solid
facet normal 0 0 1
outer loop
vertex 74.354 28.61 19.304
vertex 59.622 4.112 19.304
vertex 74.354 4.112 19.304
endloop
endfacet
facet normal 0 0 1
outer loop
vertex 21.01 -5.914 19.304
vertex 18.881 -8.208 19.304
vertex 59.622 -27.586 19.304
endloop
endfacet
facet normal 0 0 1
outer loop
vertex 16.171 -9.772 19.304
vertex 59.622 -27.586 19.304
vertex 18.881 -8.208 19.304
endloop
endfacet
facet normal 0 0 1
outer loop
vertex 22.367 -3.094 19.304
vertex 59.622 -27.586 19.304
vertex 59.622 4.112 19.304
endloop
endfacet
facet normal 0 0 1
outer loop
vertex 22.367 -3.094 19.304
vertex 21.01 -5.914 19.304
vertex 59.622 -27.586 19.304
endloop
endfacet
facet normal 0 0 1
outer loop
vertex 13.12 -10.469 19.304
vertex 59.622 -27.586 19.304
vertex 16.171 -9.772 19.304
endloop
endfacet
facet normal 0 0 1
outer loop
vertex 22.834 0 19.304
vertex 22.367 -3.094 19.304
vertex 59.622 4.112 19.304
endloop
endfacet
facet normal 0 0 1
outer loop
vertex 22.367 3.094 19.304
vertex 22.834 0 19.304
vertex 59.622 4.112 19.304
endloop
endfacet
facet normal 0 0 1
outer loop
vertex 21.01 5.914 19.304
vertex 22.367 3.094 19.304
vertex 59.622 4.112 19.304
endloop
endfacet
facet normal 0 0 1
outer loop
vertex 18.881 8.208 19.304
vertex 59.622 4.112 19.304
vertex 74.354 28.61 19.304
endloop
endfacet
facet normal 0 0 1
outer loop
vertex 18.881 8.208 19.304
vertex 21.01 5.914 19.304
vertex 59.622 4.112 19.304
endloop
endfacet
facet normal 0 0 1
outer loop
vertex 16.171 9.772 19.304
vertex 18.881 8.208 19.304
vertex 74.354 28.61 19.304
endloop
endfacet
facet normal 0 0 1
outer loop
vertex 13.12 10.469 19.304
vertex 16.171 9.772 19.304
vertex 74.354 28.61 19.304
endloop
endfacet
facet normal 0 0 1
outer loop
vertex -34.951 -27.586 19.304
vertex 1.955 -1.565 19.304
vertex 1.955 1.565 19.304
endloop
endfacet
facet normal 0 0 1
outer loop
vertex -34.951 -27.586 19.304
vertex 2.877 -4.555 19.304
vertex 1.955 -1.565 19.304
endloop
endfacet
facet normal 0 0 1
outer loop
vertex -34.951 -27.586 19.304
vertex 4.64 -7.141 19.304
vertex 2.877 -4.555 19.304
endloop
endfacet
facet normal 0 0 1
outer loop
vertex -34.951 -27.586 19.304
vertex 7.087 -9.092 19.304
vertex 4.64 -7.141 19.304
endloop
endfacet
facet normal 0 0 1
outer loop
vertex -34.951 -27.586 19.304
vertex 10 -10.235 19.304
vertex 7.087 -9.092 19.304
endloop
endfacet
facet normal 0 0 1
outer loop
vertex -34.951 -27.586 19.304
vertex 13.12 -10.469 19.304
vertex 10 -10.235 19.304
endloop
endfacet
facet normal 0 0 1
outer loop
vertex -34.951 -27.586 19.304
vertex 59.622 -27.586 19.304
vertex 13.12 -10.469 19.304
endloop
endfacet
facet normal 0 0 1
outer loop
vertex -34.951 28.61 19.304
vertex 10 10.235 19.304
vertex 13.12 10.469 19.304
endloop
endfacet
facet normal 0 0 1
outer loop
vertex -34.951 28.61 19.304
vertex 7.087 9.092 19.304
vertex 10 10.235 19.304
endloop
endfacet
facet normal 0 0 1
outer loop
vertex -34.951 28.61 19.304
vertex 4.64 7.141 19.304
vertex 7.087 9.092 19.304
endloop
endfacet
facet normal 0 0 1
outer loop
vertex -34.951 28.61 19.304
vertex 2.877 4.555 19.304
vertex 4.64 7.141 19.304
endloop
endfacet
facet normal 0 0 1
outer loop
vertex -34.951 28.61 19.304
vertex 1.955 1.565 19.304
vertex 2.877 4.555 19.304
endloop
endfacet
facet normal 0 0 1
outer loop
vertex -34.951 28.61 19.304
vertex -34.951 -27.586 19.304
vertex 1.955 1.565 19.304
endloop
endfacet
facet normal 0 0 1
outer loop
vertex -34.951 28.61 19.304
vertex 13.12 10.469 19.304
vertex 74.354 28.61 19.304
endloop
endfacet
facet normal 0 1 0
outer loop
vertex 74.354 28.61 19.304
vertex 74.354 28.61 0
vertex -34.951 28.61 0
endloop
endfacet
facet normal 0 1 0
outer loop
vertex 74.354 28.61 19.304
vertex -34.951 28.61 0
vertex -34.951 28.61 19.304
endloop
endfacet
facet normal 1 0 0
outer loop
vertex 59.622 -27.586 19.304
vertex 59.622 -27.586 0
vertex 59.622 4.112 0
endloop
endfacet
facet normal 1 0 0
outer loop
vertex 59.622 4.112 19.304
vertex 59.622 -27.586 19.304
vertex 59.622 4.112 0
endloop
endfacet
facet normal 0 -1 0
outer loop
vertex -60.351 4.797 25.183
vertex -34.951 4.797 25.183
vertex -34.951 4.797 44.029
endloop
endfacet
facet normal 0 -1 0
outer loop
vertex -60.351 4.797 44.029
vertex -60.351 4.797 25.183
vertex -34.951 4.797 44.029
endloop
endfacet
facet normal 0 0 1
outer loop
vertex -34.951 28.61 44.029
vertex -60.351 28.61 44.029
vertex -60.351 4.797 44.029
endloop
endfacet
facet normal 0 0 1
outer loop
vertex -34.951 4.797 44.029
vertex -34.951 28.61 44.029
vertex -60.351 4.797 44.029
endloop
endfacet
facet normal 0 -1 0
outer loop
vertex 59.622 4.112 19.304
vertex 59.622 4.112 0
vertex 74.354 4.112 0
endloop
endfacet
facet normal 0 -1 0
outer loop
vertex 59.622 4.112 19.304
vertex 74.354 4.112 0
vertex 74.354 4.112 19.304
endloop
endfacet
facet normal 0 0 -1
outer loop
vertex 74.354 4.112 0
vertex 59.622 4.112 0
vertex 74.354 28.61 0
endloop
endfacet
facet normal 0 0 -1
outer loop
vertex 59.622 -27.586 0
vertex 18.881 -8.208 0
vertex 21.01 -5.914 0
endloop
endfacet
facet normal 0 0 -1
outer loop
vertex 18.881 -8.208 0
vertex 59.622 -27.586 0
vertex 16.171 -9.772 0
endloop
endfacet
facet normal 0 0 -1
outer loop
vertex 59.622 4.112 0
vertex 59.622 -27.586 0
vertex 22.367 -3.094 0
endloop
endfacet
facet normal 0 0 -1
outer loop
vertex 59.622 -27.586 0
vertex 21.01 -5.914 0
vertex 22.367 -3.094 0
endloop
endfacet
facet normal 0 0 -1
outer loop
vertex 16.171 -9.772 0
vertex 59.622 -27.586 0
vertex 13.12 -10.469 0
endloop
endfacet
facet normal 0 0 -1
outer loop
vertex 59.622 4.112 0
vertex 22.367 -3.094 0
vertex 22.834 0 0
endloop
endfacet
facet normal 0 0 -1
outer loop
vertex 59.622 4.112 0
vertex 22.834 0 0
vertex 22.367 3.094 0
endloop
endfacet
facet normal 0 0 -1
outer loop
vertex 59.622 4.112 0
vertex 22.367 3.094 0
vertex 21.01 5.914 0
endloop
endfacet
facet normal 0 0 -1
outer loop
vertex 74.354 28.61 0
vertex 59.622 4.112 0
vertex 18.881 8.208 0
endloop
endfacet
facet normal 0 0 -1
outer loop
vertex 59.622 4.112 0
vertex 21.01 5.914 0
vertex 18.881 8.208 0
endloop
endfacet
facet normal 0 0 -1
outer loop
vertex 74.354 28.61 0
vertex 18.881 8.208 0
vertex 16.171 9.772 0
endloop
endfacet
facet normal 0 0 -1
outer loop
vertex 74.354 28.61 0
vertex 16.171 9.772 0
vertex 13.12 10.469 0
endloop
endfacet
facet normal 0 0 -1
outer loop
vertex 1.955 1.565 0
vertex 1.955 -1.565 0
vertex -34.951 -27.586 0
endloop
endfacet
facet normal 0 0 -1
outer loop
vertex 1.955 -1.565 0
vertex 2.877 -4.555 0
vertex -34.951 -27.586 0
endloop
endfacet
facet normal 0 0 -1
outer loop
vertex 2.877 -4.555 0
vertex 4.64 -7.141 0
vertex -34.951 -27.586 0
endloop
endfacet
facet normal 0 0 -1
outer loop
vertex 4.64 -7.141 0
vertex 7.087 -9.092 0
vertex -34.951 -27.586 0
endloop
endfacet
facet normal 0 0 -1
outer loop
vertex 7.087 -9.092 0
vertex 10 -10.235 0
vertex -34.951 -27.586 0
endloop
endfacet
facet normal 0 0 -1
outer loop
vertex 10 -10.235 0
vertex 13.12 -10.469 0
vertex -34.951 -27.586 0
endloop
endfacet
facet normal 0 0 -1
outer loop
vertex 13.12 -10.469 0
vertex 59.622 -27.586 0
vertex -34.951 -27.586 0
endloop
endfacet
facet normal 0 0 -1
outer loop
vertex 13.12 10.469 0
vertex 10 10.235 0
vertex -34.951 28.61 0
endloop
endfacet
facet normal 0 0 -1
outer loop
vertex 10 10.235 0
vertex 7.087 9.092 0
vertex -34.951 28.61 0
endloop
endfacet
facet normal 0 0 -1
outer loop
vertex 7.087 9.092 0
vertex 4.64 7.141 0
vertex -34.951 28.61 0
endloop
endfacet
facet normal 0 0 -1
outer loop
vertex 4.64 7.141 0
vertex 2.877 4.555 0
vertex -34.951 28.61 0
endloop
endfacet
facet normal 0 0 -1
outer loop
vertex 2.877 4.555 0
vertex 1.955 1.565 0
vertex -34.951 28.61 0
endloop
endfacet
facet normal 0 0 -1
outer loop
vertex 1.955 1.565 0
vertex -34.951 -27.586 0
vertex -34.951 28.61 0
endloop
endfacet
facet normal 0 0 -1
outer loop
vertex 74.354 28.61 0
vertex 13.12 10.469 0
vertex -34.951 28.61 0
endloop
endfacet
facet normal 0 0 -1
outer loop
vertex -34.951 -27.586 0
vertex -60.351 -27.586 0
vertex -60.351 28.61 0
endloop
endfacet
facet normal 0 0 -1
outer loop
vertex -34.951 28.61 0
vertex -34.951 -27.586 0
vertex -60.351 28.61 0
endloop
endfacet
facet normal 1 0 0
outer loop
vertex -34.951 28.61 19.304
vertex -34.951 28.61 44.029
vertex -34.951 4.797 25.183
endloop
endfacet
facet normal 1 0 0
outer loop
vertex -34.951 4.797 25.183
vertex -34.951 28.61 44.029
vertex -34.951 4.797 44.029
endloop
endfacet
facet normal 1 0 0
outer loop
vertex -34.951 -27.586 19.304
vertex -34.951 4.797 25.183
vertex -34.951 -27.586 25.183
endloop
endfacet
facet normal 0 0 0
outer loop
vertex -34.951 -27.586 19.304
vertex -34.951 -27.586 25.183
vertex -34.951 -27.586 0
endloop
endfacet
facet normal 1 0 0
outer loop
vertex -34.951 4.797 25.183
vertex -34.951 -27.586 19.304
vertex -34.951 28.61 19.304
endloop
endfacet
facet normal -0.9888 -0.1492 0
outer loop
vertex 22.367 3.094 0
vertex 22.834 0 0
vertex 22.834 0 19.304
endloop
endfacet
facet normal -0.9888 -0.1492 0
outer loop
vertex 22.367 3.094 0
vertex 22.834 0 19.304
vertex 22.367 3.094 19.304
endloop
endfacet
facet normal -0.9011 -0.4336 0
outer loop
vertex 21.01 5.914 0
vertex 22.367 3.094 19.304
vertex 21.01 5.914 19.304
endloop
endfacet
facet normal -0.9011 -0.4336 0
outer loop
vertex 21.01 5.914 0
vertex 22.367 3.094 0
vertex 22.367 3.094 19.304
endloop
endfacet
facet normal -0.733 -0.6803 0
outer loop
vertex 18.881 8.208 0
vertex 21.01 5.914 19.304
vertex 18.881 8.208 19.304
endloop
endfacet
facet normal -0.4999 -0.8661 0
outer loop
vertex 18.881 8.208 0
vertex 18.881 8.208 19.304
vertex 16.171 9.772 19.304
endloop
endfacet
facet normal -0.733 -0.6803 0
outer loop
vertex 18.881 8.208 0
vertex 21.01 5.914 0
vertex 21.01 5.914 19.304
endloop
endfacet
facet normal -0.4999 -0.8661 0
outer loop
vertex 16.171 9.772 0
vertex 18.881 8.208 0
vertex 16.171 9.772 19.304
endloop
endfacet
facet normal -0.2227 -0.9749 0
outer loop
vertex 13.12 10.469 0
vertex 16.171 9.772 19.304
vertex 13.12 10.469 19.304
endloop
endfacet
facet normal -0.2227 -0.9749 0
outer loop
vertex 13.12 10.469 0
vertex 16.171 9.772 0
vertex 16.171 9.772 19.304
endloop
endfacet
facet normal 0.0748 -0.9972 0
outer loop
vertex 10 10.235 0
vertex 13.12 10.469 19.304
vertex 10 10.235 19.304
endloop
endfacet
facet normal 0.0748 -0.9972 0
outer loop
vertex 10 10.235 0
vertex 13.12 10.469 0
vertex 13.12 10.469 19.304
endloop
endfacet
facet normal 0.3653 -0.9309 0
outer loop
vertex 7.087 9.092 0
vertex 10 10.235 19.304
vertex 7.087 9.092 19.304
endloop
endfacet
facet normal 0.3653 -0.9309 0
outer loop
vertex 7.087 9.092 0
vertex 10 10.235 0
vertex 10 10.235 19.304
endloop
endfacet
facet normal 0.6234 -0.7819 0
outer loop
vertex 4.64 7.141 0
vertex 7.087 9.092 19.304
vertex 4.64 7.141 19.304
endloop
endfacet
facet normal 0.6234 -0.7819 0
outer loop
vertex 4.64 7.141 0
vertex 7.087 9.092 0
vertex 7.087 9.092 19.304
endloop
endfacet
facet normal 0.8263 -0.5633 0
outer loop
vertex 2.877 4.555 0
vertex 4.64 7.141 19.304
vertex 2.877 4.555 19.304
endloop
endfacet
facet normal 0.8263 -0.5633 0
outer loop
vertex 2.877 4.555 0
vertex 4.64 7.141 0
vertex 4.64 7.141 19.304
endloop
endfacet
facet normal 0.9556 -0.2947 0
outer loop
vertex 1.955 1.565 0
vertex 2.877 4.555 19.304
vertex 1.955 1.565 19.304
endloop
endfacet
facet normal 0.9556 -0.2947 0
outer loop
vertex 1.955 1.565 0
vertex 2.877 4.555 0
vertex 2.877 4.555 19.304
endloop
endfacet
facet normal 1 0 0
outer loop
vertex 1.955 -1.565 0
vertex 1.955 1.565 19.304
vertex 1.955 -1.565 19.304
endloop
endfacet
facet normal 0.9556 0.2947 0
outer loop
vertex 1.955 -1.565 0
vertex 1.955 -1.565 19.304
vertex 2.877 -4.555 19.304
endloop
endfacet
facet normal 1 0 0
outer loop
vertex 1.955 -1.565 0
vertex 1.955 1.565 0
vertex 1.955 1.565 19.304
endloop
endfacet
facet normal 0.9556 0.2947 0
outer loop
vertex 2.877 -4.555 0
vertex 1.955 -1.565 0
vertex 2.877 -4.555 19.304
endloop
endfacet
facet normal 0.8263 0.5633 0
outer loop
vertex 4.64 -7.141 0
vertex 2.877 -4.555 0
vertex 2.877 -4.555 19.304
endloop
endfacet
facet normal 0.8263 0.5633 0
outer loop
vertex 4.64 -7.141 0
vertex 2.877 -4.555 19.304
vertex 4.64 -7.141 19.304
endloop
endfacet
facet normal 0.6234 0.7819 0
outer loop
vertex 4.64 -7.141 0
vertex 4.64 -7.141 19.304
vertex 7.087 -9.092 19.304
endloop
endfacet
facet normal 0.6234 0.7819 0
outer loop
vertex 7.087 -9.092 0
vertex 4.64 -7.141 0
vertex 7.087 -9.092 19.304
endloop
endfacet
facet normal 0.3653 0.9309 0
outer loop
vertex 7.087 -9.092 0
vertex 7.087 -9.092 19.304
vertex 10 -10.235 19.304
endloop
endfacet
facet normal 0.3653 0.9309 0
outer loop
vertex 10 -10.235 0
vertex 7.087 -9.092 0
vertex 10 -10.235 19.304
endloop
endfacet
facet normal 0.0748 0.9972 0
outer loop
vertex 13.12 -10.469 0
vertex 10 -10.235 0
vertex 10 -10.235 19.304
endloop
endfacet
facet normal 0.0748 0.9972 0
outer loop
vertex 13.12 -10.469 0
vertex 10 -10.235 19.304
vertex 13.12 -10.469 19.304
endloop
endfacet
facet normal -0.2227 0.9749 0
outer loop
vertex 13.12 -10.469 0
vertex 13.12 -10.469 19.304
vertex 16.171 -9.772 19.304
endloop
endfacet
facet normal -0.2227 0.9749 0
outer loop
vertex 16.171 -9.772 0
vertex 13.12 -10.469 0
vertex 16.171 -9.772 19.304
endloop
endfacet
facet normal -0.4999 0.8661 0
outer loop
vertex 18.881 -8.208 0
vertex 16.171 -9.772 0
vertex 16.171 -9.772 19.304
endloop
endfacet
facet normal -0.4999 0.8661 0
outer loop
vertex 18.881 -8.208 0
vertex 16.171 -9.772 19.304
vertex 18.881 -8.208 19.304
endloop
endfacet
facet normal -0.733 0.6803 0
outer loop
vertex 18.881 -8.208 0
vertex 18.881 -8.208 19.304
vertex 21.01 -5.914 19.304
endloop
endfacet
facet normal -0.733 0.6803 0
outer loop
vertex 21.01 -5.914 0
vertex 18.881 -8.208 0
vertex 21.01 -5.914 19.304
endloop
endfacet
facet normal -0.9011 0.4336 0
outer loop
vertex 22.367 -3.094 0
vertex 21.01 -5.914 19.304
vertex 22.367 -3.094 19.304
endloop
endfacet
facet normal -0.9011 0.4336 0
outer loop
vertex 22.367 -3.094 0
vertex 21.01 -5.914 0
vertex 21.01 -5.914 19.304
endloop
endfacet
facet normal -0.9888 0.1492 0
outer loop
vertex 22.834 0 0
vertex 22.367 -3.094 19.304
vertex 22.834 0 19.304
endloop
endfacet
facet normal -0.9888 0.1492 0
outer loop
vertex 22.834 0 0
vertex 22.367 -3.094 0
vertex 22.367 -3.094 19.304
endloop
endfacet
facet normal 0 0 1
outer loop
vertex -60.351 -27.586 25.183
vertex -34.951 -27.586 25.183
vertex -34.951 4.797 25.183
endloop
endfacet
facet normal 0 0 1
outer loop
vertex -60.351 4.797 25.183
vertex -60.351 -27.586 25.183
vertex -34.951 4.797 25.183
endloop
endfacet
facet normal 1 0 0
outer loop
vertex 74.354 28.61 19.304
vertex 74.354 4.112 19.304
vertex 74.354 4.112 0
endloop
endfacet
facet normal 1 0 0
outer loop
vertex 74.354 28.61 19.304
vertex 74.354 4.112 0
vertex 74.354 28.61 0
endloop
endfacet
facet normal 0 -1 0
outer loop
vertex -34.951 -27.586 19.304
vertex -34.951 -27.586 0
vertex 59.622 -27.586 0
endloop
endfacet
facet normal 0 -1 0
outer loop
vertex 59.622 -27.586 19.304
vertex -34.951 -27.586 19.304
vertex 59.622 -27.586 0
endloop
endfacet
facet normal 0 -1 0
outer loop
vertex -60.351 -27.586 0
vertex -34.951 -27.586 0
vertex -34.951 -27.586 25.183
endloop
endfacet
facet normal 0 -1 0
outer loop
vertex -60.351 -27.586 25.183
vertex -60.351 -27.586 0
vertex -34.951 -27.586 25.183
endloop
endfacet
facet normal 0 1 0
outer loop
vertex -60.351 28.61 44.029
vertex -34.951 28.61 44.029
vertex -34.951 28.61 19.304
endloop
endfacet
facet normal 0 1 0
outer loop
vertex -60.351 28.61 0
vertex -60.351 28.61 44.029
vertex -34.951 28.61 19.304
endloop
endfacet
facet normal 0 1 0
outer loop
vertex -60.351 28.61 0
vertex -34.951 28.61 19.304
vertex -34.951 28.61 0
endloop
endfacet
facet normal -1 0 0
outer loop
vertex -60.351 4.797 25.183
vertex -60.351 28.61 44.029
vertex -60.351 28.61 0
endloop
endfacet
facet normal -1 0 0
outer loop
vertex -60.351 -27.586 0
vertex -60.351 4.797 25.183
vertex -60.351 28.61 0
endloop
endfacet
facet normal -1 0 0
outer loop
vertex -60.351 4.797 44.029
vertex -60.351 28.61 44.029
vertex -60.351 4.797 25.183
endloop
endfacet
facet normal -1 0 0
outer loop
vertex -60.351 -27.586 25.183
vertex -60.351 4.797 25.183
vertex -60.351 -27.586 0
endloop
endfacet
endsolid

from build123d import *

# Parameters (mm, degrees)
F0_W     = 94.572848
F0_H     = 56.195463
F0_R     = 10.49808
F1_DEPTH = 19.304
F2_W     = 23.812594
F2_H     = 18.846037
F3_DEPTH = 25.4
F4_W     = 24.497905
F4_H     = 19.304
F5_DEPTH = 14.732


with BuildPart() as f1:
    # F0 (on Top) → F1 (new body)
    with BuildSketch(Plane.XY):
        with Locations((12.33559, 0.512037)):
            Rectangle(F0_W, F0_H)
        with Locations((12.33559, 0)):
            Circle(F0_R, mode=Mode.SUBTRACT)
    extrude(amount=F1_DEPTH)

    # F2 (on face) → F3 (join)
    with BuildSketch(Plane(origin=(-34.950834, 0, 0), x_dir=(0, -1, 0), z_dir=(-1, 0, 0))):
        with Locations((-16.703471, 34.606232)):
            Rectangle(F2_W, F2_H)
        Polygon((-4.797174, 25.183214), (-28.609768, 25.183214), (-28.609768, 0), (27.585695, 0), (27.585695, 25.183214), align=None)
    extrude(amount=F3_DEPTH)

    # F4 (on face) → F5 (join)
    with BuildSketch(Plane.YZ.offset(59.622014)):
        with Locations((16.360816, 9.652)):
            Rectangle(F4_W, F4_H)
    extrude(amount=F5_DEPTH)


solid = f1.part
